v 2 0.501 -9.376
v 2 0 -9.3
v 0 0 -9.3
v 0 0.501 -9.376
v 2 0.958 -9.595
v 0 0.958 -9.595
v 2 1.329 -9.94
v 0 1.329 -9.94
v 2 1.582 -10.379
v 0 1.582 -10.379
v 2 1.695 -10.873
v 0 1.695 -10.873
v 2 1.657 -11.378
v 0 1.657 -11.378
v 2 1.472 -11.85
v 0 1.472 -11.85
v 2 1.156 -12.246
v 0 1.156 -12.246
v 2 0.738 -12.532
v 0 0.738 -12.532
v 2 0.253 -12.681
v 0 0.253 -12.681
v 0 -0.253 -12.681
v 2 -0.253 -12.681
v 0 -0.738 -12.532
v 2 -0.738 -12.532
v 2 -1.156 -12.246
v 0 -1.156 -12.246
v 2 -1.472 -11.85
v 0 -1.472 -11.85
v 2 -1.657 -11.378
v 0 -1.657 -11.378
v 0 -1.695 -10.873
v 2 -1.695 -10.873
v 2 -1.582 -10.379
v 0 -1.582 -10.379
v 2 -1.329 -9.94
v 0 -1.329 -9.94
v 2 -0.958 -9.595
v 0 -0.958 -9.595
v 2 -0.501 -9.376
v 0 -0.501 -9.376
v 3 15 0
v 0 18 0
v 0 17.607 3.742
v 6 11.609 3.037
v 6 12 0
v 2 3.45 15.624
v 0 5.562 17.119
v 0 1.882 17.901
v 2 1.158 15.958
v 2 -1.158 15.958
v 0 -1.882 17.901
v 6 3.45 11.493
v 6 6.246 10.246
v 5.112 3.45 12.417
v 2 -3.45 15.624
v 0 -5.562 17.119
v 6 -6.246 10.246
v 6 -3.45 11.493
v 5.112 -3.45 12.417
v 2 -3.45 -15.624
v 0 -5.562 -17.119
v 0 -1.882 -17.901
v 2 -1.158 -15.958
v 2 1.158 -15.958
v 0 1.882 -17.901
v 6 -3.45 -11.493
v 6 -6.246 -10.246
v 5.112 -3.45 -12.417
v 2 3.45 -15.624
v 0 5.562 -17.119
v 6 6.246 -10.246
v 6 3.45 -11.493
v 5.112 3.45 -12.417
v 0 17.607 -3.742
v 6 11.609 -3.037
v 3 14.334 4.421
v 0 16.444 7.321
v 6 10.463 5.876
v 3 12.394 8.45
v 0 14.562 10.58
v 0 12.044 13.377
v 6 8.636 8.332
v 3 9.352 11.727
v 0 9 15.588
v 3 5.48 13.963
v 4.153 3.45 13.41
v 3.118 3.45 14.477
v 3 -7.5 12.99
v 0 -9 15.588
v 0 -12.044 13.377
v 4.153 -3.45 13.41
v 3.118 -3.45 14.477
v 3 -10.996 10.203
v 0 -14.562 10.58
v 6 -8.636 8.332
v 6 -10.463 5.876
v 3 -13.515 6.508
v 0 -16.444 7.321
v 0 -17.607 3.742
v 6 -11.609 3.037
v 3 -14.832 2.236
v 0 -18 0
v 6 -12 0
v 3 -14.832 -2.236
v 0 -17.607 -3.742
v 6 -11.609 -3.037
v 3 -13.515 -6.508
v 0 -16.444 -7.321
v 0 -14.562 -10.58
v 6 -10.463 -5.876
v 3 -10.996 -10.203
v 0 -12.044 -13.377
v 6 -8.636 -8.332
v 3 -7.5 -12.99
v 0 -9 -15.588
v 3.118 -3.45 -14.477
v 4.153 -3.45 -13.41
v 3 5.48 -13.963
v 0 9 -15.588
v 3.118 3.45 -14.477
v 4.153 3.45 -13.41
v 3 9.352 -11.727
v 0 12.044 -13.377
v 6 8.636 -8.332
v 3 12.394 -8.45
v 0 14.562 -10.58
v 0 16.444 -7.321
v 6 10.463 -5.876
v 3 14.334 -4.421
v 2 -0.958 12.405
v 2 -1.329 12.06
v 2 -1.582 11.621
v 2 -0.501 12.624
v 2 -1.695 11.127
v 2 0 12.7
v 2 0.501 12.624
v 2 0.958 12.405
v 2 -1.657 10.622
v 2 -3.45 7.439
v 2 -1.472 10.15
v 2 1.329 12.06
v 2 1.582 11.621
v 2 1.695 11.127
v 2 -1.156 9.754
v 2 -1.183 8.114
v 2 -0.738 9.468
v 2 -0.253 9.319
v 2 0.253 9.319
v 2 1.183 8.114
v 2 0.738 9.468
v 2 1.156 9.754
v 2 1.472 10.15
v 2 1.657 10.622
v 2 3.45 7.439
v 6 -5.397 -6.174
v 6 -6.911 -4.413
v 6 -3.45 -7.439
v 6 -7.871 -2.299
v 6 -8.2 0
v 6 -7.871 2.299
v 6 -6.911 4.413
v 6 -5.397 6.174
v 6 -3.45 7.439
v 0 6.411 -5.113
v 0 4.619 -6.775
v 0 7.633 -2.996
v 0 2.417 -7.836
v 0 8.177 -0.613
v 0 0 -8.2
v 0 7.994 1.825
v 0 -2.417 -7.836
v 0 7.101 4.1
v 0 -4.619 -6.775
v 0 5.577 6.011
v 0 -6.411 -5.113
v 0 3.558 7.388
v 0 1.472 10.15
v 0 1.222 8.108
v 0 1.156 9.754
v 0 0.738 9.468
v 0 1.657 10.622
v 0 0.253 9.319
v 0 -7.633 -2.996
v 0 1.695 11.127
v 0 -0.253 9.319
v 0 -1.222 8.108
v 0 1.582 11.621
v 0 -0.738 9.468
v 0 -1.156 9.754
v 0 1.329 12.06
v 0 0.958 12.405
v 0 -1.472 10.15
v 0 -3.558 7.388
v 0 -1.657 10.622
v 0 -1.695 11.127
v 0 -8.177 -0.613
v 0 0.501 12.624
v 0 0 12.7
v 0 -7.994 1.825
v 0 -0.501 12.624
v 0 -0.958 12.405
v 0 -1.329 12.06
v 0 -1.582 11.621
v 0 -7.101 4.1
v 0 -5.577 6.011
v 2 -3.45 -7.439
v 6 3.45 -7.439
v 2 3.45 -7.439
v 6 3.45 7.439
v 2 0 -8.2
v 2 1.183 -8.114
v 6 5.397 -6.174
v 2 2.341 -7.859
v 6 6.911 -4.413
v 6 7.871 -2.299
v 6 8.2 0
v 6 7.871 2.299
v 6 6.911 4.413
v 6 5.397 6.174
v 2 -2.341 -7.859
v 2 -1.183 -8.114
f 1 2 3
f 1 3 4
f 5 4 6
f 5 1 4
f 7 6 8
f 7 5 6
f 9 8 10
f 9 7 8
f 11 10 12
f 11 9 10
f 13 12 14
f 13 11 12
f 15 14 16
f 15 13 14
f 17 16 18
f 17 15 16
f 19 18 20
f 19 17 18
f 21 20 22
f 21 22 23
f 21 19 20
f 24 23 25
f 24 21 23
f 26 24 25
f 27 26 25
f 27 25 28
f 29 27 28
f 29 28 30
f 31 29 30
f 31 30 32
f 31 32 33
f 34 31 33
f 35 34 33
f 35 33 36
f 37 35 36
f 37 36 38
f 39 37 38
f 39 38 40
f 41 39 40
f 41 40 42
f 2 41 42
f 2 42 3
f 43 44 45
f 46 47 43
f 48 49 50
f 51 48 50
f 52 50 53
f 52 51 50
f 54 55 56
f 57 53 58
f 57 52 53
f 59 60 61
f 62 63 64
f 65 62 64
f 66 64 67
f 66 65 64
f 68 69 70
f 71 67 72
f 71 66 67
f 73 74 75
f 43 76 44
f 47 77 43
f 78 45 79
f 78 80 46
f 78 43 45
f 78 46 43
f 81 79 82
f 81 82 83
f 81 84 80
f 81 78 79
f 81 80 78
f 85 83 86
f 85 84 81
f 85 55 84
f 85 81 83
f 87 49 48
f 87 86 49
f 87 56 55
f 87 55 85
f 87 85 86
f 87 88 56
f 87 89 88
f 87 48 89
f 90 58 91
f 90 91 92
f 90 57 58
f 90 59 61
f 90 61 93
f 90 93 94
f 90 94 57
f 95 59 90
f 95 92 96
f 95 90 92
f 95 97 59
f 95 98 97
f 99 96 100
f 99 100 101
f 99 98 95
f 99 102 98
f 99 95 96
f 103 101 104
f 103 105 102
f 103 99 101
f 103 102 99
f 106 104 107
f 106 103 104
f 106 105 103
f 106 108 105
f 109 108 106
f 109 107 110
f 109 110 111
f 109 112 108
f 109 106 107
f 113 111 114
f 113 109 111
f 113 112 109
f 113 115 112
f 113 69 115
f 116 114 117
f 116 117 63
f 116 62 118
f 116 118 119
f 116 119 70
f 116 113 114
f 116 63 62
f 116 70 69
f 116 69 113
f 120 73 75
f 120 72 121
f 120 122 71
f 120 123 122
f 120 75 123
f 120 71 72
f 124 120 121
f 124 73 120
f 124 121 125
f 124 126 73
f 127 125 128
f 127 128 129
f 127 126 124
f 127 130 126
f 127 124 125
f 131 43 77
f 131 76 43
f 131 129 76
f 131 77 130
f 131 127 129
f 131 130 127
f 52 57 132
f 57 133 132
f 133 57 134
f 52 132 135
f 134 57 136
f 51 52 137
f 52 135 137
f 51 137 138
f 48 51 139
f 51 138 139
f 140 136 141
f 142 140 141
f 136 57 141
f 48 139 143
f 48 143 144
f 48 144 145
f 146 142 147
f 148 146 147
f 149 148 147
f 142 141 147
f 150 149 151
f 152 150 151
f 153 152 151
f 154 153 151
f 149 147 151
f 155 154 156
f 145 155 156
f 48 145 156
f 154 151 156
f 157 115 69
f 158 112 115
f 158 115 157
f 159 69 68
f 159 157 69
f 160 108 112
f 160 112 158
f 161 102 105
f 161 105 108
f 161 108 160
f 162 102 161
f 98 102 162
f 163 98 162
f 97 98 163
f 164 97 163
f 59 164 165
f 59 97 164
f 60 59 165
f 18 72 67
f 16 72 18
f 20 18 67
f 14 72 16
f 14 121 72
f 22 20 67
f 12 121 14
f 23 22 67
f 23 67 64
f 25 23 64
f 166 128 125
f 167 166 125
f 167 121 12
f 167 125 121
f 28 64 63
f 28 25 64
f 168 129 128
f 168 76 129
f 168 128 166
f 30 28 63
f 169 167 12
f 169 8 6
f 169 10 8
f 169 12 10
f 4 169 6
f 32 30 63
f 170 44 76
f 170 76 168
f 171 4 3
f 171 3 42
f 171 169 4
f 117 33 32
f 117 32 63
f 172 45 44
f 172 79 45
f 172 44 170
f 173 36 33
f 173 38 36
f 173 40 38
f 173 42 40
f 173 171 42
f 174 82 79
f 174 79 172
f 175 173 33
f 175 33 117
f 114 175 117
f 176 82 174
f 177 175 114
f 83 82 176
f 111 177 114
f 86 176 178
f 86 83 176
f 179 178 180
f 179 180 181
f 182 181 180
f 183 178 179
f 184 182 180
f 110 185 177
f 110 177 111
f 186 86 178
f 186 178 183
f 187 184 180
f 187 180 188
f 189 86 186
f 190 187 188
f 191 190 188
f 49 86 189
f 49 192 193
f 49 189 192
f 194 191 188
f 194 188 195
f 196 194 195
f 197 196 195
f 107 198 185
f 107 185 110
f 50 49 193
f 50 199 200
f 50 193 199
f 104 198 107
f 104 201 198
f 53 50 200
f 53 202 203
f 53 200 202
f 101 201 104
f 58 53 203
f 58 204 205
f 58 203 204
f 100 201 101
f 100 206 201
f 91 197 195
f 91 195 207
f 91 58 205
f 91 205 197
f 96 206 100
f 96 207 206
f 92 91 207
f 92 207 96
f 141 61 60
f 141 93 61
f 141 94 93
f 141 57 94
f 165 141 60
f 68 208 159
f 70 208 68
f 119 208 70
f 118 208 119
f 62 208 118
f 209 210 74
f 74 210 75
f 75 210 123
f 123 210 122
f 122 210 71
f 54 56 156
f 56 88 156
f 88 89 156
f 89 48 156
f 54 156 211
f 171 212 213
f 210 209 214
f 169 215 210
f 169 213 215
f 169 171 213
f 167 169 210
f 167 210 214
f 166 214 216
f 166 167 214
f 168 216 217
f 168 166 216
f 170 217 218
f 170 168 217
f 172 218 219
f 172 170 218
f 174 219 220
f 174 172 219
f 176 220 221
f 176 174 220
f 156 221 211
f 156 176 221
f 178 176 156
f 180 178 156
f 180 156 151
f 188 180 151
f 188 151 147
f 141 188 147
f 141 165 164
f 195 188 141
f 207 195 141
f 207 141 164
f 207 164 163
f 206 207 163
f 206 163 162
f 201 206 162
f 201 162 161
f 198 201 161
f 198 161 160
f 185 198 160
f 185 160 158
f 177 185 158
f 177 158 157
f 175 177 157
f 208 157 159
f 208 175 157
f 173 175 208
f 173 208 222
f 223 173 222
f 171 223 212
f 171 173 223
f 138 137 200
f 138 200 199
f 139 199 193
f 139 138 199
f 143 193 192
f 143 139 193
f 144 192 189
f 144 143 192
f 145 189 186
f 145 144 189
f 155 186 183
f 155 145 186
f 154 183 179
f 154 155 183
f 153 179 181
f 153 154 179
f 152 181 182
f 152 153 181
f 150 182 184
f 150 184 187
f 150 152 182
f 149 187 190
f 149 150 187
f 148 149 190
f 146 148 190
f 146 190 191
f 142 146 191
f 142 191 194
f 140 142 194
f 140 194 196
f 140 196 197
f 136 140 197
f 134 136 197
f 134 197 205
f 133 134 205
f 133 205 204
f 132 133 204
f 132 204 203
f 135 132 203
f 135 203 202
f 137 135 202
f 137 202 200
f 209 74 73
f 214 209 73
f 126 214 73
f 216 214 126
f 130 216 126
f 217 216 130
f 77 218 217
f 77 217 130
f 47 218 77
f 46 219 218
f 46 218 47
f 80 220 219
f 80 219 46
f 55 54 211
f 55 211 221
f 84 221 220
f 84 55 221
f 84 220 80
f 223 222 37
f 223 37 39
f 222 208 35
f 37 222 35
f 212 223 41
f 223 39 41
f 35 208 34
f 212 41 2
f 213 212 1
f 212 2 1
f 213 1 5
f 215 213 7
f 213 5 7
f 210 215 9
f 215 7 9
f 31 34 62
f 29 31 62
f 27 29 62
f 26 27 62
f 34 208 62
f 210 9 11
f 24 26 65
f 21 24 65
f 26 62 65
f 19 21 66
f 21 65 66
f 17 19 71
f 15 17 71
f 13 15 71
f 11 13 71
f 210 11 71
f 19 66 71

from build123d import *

# Parameters (mm, degrees)
CYLINDER_R           = 2.95
CYLINDER_DEPTH       = 7
CYLINDER001_R        = 1.7
CYLINDER001_DEPTH    = 30
CLONE062_PITCH_ANGLE = -90
CLONE061_PITCH_ANGLE = -90
BOX246_W             = 10
BOX246_H             = 6.9
BOX246_DEPTH         = 34
CYLINDER1003_R       = 8.2
CYLINDER1003_DEPTH   = 15
CLONE058_PITCH_ANGLE = 90


with BuildPart() as m3bolthead:
    # Cylinder → Cylinder (new body)
    with BuildSketch(Plane.XY):
        Circle(CYLINDER_R)
    extrude(amount=CYLINDER_DEPTH)


with BuildPart() as m3bolt:
    # Cylinder001 → Cylinder001 (new body)
    with BuildSketch(Plane.XY.offset(6)):
        Circle(CYLINDER001_R)
    extrude(amount=CYLINDER001_DEPTH)

    # Fusion: union M3BoltHead
    add(m3bolthead.part)


with BuildPart() as clone_of_m3bolt022:
    # Clone062 base: copy of M3Bolt
    add(m3bolt.part)


with BuildPart() as clone_of_m3bolt022_1:
    # Clone062 pitch: moved
    add(clone_of_m3bolt022.part.rotate(Axis((0, 0, 0), (0, 1, 0)), CLONE062_PITCH_ANGLE))


with BuildPart() as clone_of_m3bolt022_2:
    # Clone062 placement: moved
    add(clone_of_m3bolt022_1.part.moved(Location((36, 0, -11))))


with BuildPart() as clone_of_m3bolt021:
    # Clone061 base: copy of M3Bolt
    add(m3bolt.part)


with BuildPart() as clone_of_m3bolt021_1:
    # Clone061 pitch: moved
    add(clone_of_m3bolt021.part.rotate(Axis((0, 0, 0), (0, 1, 0)), CLONE061_PITCH_ANGLE))


with BuildPart() as clone_of_m3bolt021_2:
    # Clone061 placement: moved
    add(clone_of_m3bolt021_1.part.moved(Location((36, 0, 11))))


with BuildPart() as cube010:
    # Box246 → Box246 (new body)
    with BuildSketch(Plane(origin=(2, -3.45, -17), x_dir=(1, 0, 0), z_dir=(0, 0, 1))):
        with Locations((5, 3.45)):
            Rectangle(BOX246_W, BOX246_H)
    extrude(amount=BOX246_DEPTH)


with BuildPart() as fusion021:
    # Cylinder1003 → Cylinder1003 (new body)
    with BuildSketch(Plane.XY):
        Circle(CYLINDER1003_R)
    extrude(amount=CYLINDER1003_DEPTH)


with BuildPart() as fusion021_1:
    # Clone058 pitch: moved
    add(fusion021.part.rotate(Axis((0, 0, 0), (0, 1, 0)), CLONE058_PITCH_ANGLE))


with BuildPart() as fusion021_2:
    # Clone058 placement: moved
    add(fusion021_1.part)

    # Fusion021: union Clone of M3Bolt022, Clone of M3Bolt021, Cube010
    add(clone_of_m3bolt022_2.part)
    add(clone_of_m3bolt021_2.part)
    add(cube010.part)


with BuildPart() as f_625zzbearinghousingmaster:
    # Sketch016 → Revolution003 (revolve)
    with BuildSketch(Plane.XY):
        Polygon((0, 0), (0, 18), (6, 12), (6, 0), align=None)
    revolve(axis=Axis((0, 0, 0), (1, 0, 0)))

    # Cut020: cut Fusion021
    add(fusion021_2.part, mode=Mode.SUBTRACT)


solid = f_625zzbearinghousingmaster.part
